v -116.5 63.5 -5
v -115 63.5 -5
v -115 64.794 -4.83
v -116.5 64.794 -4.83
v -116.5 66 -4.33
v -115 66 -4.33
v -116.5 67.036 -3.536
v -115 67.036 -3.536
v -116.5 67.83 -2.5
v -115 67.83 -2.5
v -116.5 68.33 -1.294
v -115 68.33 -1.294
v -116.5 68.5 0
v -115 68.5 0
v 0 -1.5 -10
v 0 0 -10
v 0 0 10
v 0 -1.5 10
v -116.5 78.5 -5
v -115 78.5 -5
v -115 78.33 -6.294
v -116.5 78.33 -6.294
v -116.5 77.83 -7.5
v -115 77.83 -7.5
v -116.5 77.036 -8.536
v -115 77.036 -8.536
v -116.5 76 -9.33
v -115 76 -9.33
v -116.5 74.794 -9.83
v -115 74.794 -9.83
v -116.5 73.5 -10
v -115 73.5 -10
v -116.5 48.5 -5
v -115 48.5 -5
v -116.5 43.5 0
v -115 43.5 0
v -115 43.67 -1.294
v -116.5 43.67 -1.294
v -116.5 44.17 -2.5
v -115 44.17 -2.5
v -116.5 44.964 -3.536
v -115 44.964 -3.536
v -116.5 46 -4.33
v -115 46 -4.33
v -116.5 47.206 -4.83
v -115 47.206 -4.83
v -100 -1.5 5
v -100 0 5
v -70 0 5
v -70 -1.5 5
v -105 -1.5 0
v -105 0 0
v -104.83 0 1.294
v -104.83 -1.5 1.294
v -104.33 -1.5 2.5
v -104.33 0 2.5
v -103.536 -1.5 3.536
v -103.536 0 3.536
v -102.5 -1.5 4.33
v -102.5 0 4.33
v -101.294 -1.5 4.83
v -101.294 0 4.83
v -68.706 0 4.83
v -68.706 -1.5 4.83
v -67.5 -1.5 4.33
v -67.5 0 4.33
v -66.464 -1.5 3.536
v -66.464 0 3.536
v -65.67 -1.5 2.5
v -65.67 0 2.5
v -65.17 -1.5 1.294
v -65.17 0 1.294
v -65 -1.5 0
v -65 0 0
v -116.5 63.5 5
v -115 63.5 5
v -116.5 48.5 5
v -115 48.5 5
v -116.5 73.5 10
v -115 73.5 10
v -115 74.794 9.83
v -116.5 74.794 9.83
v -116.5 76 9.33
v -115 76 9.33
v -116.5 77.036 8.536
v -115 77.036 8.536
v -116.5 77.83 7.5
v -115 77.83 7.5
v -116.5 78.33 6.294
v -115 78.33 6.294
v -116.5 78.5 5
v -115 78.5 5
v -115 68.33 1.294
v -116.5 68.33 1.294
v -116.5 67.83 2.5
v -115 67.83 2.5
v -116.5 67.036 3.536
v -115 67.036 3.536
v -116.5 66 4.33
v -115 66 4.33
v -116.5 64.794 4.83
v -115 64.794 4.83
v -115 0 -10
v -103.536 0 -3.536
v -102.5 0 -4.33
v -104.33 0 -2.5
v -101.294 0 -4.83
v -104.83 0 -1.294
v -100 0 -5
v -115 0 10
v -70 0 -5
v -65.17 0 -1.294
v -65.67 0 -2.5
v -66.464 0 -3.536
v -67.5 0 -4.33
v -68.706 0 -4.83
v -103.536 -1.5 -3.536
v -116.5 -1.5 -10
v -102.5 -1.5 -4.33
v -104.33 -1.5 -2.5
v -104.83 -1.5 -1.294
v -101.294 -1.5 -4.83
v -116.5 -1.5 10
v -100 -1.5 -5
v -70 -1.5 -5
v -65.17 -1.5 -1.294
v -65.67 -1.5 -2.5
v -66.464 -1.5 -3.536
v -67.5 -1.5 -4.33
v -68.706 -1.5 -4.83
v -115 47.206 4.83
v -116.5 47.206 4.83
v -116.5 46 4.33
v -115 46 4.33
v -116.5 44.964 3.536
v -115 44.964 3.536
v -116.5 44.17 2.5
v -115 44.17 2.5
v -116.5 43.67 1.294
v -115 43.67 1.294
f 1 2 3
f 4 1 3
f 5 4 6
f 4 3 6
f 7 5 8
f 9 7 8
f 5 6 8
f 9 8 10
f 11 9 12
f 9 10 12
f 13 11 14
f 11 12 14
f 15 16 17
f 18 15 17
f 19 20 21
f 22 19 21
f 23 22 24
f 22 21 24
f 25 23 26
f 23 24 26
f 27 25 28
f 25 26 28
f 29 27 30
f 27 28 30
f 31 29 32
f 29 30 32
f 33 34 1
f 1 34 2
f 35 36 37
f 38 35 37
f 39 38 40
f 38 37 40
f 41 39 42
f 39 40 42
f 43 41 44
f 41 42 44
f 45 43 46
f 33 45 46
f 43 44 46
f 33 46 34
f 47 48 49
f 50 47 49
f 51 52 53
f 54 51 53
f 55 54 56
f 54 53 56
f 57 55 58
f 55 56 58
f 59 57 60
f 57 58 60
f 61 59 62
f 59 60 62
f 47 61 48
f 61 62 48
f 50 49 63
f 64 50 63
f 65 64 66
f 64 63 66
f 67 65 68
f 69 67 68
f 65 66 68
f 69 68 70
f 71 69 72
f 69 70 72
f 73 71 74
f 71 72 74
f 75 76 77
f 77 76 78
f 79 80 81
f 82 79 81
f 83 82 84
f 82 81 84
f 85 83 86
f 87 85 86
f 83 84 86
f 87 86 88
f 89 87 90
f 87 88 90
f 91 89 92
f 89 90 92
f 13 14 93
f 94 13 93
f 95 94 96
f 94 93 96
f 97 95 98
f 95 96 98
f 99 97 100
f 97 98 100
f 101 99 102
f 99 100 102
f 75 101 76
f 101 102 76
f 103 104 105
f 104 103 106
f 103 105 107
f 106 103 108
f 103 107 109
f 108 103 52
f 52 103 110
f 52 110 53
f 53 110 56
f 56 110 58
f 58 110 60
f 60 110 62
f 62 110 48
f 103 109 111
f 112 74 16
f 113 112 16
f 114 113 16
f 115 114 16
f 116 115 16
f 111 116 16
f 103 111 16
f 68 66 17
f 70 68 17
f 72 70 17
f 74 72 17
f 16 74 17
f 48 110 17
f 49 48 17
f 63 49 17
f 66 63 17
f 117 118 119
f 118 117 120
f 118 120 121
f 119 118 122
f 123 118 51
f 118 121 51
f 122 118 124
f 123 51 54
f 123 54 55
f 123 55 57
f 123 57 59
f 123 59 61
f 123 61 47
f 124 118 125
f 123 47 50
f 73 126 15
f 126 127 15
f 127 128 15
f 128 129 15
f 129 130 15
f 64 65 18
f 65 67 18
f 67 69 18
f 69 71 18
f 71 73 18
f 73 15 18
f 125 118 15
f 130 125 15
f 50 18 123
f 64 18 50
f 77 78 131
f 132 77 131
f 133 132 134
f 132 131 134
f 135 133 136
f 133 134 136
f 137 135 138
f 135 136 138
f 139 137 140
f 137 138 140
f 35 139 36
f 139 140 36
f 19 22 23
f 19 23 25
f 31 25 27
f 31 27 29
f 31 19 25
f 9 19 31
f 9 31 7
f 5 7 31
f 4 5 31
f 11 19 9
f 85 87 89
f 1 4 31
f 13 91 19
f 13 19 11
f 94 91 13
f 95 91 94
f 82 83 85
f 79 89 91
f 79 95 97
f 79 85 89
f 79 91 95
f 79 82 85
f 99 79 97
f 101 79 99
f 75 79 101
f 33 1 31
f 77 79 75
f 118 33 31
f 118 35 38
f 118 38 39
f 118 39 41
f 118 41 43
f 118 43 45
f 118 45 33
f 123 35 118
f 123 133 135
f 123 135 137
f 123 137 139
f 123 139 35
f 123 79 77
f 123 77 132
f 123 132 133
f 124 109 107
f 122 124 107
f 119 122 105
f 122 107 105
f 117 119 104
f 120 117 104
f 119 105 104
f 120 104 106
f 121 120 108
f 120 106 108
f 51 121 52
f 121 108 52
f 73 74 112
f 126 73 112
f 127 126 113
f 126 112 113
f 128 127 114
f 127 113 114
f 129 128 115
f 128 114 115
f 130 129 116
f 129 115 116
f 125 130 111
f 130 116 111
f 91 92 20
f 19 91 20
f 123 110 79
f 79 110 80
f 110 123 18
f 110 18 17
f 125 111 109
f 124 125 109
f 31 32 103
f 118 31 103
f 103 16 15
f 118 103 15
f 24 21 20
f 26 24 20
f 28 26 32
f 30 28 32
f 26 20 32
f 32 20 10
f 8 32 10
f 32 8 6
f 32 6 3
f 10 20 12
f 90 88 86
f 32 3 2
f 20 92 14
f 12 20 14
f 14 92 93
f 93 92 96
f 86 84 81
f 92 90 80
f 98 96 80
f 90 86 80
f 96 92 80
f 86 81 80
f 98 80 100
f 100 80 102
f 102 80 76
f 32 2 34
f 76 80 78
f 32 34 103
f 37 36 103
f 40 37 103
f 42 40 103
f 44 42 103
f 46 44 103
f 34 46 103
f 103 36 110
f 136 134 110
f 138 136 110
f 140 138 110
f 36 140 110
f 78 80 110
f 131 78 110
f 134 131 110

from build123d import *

# Parameters (mm, degrees)
F1_DEPTH = 1.5
F3_DEPTH = 1.5


with BuildPart() as f1:
    # F0 (on Front) → F1 (new body)
    with BuildSketch(Plane.XZ):
        with BuildLine():
            Line((0, 5), (0, 10))
            Line((0, 10), (-115, 10))
            Line((-115, 10), (-115, -10))
            Line((-115, -10), (0, -10))
            Line((0, -10), (0, -5))
            Line((0, -5), (-50, -5))
            ThreePointArc((-50, -5), (-53.535534, -3.535534), (-55, 0))
            ThreePointArc((-55, 0), (-53.535534, 3.535534), (-50, 5))
            Line((-50, 5), (0, 5))
        make_face()
        with BuildLine():
            ThreePointArc((-65, 0), (-66.464466, -3.535534), (-70, -5))
            Line((-70, -5), (-100, -5))
            ThreePointArc((-100, -5), (-103.535534, -3.535534), (-105, 0))
            ThreePointArc((-105, 0), (-103.535534, 3.535534), (-100, 5))
            Line((-100, 5), (-70, 5))
            ThreePointArc((-70, 5), (-66.464466, 3.535534), (-65, 0))
        make_face(mode=Mode.SUBTRACT)
        with BuildLine():
            Line((0, 0), (0, 5))
            Line((0, 5), (-50, 5))
            ThreePointArc((-50, 5), (-53.535534, 3.535534), (-55, 0))
            ThreePointArc((-55, 0), (-53.535534, -3.535534), (-50, -5))
            Line((-50, -5), (0, -5))
            Line((0, -5), (0, 0))
        make_face()
    extrude(amount=F1_DEPTH)

    # F2 (on face) → F3 (join)
    with BuildSketch(Plane(origin=(-115, 0, 0), x_dir=(0, -1, 0), z_dir=(-1, 0, 0))):
        with BuildLine():
            Line((1.5, -10), (1.5, 10))
            Line((1.5, 10), (-73.5, 10))
            ThreePointArc((-73.5, 10), (-77.035534, 8.535534), (-78.5, 5))
            Line((-78.5, 5), (-78.5, -5))
            ThreePointArc((-78.5, -5), (-77.035534, -8.535534), (-73.5, -10))
            Line((-73.5, -10), (1.5, -10))
        make_face()
        with BuildLine():
            Line((-48.5, -5), (-63.5, -5))
            ThreePointArc((-63.5, -5), (-67.035534, -3.535534), (-68.5, 0))
            ThreePointArc((-68.5, 0), (-67.035534, 3.535534), (-63.5, 5))
            Line((-63.5, 5), (-48.5, 5))
            ThreePointArc((-48.5, 5), (-44.964466, 3.535534), (-43.5, 0))
            ThreePointArc((-43.5, 0), (-44.964466, -3.535534), (-48.5, -5))
        make_face(mode=Mode.SUBTRACT)
    extrude(amount=F3_DEPTH)


solid = f1.part
